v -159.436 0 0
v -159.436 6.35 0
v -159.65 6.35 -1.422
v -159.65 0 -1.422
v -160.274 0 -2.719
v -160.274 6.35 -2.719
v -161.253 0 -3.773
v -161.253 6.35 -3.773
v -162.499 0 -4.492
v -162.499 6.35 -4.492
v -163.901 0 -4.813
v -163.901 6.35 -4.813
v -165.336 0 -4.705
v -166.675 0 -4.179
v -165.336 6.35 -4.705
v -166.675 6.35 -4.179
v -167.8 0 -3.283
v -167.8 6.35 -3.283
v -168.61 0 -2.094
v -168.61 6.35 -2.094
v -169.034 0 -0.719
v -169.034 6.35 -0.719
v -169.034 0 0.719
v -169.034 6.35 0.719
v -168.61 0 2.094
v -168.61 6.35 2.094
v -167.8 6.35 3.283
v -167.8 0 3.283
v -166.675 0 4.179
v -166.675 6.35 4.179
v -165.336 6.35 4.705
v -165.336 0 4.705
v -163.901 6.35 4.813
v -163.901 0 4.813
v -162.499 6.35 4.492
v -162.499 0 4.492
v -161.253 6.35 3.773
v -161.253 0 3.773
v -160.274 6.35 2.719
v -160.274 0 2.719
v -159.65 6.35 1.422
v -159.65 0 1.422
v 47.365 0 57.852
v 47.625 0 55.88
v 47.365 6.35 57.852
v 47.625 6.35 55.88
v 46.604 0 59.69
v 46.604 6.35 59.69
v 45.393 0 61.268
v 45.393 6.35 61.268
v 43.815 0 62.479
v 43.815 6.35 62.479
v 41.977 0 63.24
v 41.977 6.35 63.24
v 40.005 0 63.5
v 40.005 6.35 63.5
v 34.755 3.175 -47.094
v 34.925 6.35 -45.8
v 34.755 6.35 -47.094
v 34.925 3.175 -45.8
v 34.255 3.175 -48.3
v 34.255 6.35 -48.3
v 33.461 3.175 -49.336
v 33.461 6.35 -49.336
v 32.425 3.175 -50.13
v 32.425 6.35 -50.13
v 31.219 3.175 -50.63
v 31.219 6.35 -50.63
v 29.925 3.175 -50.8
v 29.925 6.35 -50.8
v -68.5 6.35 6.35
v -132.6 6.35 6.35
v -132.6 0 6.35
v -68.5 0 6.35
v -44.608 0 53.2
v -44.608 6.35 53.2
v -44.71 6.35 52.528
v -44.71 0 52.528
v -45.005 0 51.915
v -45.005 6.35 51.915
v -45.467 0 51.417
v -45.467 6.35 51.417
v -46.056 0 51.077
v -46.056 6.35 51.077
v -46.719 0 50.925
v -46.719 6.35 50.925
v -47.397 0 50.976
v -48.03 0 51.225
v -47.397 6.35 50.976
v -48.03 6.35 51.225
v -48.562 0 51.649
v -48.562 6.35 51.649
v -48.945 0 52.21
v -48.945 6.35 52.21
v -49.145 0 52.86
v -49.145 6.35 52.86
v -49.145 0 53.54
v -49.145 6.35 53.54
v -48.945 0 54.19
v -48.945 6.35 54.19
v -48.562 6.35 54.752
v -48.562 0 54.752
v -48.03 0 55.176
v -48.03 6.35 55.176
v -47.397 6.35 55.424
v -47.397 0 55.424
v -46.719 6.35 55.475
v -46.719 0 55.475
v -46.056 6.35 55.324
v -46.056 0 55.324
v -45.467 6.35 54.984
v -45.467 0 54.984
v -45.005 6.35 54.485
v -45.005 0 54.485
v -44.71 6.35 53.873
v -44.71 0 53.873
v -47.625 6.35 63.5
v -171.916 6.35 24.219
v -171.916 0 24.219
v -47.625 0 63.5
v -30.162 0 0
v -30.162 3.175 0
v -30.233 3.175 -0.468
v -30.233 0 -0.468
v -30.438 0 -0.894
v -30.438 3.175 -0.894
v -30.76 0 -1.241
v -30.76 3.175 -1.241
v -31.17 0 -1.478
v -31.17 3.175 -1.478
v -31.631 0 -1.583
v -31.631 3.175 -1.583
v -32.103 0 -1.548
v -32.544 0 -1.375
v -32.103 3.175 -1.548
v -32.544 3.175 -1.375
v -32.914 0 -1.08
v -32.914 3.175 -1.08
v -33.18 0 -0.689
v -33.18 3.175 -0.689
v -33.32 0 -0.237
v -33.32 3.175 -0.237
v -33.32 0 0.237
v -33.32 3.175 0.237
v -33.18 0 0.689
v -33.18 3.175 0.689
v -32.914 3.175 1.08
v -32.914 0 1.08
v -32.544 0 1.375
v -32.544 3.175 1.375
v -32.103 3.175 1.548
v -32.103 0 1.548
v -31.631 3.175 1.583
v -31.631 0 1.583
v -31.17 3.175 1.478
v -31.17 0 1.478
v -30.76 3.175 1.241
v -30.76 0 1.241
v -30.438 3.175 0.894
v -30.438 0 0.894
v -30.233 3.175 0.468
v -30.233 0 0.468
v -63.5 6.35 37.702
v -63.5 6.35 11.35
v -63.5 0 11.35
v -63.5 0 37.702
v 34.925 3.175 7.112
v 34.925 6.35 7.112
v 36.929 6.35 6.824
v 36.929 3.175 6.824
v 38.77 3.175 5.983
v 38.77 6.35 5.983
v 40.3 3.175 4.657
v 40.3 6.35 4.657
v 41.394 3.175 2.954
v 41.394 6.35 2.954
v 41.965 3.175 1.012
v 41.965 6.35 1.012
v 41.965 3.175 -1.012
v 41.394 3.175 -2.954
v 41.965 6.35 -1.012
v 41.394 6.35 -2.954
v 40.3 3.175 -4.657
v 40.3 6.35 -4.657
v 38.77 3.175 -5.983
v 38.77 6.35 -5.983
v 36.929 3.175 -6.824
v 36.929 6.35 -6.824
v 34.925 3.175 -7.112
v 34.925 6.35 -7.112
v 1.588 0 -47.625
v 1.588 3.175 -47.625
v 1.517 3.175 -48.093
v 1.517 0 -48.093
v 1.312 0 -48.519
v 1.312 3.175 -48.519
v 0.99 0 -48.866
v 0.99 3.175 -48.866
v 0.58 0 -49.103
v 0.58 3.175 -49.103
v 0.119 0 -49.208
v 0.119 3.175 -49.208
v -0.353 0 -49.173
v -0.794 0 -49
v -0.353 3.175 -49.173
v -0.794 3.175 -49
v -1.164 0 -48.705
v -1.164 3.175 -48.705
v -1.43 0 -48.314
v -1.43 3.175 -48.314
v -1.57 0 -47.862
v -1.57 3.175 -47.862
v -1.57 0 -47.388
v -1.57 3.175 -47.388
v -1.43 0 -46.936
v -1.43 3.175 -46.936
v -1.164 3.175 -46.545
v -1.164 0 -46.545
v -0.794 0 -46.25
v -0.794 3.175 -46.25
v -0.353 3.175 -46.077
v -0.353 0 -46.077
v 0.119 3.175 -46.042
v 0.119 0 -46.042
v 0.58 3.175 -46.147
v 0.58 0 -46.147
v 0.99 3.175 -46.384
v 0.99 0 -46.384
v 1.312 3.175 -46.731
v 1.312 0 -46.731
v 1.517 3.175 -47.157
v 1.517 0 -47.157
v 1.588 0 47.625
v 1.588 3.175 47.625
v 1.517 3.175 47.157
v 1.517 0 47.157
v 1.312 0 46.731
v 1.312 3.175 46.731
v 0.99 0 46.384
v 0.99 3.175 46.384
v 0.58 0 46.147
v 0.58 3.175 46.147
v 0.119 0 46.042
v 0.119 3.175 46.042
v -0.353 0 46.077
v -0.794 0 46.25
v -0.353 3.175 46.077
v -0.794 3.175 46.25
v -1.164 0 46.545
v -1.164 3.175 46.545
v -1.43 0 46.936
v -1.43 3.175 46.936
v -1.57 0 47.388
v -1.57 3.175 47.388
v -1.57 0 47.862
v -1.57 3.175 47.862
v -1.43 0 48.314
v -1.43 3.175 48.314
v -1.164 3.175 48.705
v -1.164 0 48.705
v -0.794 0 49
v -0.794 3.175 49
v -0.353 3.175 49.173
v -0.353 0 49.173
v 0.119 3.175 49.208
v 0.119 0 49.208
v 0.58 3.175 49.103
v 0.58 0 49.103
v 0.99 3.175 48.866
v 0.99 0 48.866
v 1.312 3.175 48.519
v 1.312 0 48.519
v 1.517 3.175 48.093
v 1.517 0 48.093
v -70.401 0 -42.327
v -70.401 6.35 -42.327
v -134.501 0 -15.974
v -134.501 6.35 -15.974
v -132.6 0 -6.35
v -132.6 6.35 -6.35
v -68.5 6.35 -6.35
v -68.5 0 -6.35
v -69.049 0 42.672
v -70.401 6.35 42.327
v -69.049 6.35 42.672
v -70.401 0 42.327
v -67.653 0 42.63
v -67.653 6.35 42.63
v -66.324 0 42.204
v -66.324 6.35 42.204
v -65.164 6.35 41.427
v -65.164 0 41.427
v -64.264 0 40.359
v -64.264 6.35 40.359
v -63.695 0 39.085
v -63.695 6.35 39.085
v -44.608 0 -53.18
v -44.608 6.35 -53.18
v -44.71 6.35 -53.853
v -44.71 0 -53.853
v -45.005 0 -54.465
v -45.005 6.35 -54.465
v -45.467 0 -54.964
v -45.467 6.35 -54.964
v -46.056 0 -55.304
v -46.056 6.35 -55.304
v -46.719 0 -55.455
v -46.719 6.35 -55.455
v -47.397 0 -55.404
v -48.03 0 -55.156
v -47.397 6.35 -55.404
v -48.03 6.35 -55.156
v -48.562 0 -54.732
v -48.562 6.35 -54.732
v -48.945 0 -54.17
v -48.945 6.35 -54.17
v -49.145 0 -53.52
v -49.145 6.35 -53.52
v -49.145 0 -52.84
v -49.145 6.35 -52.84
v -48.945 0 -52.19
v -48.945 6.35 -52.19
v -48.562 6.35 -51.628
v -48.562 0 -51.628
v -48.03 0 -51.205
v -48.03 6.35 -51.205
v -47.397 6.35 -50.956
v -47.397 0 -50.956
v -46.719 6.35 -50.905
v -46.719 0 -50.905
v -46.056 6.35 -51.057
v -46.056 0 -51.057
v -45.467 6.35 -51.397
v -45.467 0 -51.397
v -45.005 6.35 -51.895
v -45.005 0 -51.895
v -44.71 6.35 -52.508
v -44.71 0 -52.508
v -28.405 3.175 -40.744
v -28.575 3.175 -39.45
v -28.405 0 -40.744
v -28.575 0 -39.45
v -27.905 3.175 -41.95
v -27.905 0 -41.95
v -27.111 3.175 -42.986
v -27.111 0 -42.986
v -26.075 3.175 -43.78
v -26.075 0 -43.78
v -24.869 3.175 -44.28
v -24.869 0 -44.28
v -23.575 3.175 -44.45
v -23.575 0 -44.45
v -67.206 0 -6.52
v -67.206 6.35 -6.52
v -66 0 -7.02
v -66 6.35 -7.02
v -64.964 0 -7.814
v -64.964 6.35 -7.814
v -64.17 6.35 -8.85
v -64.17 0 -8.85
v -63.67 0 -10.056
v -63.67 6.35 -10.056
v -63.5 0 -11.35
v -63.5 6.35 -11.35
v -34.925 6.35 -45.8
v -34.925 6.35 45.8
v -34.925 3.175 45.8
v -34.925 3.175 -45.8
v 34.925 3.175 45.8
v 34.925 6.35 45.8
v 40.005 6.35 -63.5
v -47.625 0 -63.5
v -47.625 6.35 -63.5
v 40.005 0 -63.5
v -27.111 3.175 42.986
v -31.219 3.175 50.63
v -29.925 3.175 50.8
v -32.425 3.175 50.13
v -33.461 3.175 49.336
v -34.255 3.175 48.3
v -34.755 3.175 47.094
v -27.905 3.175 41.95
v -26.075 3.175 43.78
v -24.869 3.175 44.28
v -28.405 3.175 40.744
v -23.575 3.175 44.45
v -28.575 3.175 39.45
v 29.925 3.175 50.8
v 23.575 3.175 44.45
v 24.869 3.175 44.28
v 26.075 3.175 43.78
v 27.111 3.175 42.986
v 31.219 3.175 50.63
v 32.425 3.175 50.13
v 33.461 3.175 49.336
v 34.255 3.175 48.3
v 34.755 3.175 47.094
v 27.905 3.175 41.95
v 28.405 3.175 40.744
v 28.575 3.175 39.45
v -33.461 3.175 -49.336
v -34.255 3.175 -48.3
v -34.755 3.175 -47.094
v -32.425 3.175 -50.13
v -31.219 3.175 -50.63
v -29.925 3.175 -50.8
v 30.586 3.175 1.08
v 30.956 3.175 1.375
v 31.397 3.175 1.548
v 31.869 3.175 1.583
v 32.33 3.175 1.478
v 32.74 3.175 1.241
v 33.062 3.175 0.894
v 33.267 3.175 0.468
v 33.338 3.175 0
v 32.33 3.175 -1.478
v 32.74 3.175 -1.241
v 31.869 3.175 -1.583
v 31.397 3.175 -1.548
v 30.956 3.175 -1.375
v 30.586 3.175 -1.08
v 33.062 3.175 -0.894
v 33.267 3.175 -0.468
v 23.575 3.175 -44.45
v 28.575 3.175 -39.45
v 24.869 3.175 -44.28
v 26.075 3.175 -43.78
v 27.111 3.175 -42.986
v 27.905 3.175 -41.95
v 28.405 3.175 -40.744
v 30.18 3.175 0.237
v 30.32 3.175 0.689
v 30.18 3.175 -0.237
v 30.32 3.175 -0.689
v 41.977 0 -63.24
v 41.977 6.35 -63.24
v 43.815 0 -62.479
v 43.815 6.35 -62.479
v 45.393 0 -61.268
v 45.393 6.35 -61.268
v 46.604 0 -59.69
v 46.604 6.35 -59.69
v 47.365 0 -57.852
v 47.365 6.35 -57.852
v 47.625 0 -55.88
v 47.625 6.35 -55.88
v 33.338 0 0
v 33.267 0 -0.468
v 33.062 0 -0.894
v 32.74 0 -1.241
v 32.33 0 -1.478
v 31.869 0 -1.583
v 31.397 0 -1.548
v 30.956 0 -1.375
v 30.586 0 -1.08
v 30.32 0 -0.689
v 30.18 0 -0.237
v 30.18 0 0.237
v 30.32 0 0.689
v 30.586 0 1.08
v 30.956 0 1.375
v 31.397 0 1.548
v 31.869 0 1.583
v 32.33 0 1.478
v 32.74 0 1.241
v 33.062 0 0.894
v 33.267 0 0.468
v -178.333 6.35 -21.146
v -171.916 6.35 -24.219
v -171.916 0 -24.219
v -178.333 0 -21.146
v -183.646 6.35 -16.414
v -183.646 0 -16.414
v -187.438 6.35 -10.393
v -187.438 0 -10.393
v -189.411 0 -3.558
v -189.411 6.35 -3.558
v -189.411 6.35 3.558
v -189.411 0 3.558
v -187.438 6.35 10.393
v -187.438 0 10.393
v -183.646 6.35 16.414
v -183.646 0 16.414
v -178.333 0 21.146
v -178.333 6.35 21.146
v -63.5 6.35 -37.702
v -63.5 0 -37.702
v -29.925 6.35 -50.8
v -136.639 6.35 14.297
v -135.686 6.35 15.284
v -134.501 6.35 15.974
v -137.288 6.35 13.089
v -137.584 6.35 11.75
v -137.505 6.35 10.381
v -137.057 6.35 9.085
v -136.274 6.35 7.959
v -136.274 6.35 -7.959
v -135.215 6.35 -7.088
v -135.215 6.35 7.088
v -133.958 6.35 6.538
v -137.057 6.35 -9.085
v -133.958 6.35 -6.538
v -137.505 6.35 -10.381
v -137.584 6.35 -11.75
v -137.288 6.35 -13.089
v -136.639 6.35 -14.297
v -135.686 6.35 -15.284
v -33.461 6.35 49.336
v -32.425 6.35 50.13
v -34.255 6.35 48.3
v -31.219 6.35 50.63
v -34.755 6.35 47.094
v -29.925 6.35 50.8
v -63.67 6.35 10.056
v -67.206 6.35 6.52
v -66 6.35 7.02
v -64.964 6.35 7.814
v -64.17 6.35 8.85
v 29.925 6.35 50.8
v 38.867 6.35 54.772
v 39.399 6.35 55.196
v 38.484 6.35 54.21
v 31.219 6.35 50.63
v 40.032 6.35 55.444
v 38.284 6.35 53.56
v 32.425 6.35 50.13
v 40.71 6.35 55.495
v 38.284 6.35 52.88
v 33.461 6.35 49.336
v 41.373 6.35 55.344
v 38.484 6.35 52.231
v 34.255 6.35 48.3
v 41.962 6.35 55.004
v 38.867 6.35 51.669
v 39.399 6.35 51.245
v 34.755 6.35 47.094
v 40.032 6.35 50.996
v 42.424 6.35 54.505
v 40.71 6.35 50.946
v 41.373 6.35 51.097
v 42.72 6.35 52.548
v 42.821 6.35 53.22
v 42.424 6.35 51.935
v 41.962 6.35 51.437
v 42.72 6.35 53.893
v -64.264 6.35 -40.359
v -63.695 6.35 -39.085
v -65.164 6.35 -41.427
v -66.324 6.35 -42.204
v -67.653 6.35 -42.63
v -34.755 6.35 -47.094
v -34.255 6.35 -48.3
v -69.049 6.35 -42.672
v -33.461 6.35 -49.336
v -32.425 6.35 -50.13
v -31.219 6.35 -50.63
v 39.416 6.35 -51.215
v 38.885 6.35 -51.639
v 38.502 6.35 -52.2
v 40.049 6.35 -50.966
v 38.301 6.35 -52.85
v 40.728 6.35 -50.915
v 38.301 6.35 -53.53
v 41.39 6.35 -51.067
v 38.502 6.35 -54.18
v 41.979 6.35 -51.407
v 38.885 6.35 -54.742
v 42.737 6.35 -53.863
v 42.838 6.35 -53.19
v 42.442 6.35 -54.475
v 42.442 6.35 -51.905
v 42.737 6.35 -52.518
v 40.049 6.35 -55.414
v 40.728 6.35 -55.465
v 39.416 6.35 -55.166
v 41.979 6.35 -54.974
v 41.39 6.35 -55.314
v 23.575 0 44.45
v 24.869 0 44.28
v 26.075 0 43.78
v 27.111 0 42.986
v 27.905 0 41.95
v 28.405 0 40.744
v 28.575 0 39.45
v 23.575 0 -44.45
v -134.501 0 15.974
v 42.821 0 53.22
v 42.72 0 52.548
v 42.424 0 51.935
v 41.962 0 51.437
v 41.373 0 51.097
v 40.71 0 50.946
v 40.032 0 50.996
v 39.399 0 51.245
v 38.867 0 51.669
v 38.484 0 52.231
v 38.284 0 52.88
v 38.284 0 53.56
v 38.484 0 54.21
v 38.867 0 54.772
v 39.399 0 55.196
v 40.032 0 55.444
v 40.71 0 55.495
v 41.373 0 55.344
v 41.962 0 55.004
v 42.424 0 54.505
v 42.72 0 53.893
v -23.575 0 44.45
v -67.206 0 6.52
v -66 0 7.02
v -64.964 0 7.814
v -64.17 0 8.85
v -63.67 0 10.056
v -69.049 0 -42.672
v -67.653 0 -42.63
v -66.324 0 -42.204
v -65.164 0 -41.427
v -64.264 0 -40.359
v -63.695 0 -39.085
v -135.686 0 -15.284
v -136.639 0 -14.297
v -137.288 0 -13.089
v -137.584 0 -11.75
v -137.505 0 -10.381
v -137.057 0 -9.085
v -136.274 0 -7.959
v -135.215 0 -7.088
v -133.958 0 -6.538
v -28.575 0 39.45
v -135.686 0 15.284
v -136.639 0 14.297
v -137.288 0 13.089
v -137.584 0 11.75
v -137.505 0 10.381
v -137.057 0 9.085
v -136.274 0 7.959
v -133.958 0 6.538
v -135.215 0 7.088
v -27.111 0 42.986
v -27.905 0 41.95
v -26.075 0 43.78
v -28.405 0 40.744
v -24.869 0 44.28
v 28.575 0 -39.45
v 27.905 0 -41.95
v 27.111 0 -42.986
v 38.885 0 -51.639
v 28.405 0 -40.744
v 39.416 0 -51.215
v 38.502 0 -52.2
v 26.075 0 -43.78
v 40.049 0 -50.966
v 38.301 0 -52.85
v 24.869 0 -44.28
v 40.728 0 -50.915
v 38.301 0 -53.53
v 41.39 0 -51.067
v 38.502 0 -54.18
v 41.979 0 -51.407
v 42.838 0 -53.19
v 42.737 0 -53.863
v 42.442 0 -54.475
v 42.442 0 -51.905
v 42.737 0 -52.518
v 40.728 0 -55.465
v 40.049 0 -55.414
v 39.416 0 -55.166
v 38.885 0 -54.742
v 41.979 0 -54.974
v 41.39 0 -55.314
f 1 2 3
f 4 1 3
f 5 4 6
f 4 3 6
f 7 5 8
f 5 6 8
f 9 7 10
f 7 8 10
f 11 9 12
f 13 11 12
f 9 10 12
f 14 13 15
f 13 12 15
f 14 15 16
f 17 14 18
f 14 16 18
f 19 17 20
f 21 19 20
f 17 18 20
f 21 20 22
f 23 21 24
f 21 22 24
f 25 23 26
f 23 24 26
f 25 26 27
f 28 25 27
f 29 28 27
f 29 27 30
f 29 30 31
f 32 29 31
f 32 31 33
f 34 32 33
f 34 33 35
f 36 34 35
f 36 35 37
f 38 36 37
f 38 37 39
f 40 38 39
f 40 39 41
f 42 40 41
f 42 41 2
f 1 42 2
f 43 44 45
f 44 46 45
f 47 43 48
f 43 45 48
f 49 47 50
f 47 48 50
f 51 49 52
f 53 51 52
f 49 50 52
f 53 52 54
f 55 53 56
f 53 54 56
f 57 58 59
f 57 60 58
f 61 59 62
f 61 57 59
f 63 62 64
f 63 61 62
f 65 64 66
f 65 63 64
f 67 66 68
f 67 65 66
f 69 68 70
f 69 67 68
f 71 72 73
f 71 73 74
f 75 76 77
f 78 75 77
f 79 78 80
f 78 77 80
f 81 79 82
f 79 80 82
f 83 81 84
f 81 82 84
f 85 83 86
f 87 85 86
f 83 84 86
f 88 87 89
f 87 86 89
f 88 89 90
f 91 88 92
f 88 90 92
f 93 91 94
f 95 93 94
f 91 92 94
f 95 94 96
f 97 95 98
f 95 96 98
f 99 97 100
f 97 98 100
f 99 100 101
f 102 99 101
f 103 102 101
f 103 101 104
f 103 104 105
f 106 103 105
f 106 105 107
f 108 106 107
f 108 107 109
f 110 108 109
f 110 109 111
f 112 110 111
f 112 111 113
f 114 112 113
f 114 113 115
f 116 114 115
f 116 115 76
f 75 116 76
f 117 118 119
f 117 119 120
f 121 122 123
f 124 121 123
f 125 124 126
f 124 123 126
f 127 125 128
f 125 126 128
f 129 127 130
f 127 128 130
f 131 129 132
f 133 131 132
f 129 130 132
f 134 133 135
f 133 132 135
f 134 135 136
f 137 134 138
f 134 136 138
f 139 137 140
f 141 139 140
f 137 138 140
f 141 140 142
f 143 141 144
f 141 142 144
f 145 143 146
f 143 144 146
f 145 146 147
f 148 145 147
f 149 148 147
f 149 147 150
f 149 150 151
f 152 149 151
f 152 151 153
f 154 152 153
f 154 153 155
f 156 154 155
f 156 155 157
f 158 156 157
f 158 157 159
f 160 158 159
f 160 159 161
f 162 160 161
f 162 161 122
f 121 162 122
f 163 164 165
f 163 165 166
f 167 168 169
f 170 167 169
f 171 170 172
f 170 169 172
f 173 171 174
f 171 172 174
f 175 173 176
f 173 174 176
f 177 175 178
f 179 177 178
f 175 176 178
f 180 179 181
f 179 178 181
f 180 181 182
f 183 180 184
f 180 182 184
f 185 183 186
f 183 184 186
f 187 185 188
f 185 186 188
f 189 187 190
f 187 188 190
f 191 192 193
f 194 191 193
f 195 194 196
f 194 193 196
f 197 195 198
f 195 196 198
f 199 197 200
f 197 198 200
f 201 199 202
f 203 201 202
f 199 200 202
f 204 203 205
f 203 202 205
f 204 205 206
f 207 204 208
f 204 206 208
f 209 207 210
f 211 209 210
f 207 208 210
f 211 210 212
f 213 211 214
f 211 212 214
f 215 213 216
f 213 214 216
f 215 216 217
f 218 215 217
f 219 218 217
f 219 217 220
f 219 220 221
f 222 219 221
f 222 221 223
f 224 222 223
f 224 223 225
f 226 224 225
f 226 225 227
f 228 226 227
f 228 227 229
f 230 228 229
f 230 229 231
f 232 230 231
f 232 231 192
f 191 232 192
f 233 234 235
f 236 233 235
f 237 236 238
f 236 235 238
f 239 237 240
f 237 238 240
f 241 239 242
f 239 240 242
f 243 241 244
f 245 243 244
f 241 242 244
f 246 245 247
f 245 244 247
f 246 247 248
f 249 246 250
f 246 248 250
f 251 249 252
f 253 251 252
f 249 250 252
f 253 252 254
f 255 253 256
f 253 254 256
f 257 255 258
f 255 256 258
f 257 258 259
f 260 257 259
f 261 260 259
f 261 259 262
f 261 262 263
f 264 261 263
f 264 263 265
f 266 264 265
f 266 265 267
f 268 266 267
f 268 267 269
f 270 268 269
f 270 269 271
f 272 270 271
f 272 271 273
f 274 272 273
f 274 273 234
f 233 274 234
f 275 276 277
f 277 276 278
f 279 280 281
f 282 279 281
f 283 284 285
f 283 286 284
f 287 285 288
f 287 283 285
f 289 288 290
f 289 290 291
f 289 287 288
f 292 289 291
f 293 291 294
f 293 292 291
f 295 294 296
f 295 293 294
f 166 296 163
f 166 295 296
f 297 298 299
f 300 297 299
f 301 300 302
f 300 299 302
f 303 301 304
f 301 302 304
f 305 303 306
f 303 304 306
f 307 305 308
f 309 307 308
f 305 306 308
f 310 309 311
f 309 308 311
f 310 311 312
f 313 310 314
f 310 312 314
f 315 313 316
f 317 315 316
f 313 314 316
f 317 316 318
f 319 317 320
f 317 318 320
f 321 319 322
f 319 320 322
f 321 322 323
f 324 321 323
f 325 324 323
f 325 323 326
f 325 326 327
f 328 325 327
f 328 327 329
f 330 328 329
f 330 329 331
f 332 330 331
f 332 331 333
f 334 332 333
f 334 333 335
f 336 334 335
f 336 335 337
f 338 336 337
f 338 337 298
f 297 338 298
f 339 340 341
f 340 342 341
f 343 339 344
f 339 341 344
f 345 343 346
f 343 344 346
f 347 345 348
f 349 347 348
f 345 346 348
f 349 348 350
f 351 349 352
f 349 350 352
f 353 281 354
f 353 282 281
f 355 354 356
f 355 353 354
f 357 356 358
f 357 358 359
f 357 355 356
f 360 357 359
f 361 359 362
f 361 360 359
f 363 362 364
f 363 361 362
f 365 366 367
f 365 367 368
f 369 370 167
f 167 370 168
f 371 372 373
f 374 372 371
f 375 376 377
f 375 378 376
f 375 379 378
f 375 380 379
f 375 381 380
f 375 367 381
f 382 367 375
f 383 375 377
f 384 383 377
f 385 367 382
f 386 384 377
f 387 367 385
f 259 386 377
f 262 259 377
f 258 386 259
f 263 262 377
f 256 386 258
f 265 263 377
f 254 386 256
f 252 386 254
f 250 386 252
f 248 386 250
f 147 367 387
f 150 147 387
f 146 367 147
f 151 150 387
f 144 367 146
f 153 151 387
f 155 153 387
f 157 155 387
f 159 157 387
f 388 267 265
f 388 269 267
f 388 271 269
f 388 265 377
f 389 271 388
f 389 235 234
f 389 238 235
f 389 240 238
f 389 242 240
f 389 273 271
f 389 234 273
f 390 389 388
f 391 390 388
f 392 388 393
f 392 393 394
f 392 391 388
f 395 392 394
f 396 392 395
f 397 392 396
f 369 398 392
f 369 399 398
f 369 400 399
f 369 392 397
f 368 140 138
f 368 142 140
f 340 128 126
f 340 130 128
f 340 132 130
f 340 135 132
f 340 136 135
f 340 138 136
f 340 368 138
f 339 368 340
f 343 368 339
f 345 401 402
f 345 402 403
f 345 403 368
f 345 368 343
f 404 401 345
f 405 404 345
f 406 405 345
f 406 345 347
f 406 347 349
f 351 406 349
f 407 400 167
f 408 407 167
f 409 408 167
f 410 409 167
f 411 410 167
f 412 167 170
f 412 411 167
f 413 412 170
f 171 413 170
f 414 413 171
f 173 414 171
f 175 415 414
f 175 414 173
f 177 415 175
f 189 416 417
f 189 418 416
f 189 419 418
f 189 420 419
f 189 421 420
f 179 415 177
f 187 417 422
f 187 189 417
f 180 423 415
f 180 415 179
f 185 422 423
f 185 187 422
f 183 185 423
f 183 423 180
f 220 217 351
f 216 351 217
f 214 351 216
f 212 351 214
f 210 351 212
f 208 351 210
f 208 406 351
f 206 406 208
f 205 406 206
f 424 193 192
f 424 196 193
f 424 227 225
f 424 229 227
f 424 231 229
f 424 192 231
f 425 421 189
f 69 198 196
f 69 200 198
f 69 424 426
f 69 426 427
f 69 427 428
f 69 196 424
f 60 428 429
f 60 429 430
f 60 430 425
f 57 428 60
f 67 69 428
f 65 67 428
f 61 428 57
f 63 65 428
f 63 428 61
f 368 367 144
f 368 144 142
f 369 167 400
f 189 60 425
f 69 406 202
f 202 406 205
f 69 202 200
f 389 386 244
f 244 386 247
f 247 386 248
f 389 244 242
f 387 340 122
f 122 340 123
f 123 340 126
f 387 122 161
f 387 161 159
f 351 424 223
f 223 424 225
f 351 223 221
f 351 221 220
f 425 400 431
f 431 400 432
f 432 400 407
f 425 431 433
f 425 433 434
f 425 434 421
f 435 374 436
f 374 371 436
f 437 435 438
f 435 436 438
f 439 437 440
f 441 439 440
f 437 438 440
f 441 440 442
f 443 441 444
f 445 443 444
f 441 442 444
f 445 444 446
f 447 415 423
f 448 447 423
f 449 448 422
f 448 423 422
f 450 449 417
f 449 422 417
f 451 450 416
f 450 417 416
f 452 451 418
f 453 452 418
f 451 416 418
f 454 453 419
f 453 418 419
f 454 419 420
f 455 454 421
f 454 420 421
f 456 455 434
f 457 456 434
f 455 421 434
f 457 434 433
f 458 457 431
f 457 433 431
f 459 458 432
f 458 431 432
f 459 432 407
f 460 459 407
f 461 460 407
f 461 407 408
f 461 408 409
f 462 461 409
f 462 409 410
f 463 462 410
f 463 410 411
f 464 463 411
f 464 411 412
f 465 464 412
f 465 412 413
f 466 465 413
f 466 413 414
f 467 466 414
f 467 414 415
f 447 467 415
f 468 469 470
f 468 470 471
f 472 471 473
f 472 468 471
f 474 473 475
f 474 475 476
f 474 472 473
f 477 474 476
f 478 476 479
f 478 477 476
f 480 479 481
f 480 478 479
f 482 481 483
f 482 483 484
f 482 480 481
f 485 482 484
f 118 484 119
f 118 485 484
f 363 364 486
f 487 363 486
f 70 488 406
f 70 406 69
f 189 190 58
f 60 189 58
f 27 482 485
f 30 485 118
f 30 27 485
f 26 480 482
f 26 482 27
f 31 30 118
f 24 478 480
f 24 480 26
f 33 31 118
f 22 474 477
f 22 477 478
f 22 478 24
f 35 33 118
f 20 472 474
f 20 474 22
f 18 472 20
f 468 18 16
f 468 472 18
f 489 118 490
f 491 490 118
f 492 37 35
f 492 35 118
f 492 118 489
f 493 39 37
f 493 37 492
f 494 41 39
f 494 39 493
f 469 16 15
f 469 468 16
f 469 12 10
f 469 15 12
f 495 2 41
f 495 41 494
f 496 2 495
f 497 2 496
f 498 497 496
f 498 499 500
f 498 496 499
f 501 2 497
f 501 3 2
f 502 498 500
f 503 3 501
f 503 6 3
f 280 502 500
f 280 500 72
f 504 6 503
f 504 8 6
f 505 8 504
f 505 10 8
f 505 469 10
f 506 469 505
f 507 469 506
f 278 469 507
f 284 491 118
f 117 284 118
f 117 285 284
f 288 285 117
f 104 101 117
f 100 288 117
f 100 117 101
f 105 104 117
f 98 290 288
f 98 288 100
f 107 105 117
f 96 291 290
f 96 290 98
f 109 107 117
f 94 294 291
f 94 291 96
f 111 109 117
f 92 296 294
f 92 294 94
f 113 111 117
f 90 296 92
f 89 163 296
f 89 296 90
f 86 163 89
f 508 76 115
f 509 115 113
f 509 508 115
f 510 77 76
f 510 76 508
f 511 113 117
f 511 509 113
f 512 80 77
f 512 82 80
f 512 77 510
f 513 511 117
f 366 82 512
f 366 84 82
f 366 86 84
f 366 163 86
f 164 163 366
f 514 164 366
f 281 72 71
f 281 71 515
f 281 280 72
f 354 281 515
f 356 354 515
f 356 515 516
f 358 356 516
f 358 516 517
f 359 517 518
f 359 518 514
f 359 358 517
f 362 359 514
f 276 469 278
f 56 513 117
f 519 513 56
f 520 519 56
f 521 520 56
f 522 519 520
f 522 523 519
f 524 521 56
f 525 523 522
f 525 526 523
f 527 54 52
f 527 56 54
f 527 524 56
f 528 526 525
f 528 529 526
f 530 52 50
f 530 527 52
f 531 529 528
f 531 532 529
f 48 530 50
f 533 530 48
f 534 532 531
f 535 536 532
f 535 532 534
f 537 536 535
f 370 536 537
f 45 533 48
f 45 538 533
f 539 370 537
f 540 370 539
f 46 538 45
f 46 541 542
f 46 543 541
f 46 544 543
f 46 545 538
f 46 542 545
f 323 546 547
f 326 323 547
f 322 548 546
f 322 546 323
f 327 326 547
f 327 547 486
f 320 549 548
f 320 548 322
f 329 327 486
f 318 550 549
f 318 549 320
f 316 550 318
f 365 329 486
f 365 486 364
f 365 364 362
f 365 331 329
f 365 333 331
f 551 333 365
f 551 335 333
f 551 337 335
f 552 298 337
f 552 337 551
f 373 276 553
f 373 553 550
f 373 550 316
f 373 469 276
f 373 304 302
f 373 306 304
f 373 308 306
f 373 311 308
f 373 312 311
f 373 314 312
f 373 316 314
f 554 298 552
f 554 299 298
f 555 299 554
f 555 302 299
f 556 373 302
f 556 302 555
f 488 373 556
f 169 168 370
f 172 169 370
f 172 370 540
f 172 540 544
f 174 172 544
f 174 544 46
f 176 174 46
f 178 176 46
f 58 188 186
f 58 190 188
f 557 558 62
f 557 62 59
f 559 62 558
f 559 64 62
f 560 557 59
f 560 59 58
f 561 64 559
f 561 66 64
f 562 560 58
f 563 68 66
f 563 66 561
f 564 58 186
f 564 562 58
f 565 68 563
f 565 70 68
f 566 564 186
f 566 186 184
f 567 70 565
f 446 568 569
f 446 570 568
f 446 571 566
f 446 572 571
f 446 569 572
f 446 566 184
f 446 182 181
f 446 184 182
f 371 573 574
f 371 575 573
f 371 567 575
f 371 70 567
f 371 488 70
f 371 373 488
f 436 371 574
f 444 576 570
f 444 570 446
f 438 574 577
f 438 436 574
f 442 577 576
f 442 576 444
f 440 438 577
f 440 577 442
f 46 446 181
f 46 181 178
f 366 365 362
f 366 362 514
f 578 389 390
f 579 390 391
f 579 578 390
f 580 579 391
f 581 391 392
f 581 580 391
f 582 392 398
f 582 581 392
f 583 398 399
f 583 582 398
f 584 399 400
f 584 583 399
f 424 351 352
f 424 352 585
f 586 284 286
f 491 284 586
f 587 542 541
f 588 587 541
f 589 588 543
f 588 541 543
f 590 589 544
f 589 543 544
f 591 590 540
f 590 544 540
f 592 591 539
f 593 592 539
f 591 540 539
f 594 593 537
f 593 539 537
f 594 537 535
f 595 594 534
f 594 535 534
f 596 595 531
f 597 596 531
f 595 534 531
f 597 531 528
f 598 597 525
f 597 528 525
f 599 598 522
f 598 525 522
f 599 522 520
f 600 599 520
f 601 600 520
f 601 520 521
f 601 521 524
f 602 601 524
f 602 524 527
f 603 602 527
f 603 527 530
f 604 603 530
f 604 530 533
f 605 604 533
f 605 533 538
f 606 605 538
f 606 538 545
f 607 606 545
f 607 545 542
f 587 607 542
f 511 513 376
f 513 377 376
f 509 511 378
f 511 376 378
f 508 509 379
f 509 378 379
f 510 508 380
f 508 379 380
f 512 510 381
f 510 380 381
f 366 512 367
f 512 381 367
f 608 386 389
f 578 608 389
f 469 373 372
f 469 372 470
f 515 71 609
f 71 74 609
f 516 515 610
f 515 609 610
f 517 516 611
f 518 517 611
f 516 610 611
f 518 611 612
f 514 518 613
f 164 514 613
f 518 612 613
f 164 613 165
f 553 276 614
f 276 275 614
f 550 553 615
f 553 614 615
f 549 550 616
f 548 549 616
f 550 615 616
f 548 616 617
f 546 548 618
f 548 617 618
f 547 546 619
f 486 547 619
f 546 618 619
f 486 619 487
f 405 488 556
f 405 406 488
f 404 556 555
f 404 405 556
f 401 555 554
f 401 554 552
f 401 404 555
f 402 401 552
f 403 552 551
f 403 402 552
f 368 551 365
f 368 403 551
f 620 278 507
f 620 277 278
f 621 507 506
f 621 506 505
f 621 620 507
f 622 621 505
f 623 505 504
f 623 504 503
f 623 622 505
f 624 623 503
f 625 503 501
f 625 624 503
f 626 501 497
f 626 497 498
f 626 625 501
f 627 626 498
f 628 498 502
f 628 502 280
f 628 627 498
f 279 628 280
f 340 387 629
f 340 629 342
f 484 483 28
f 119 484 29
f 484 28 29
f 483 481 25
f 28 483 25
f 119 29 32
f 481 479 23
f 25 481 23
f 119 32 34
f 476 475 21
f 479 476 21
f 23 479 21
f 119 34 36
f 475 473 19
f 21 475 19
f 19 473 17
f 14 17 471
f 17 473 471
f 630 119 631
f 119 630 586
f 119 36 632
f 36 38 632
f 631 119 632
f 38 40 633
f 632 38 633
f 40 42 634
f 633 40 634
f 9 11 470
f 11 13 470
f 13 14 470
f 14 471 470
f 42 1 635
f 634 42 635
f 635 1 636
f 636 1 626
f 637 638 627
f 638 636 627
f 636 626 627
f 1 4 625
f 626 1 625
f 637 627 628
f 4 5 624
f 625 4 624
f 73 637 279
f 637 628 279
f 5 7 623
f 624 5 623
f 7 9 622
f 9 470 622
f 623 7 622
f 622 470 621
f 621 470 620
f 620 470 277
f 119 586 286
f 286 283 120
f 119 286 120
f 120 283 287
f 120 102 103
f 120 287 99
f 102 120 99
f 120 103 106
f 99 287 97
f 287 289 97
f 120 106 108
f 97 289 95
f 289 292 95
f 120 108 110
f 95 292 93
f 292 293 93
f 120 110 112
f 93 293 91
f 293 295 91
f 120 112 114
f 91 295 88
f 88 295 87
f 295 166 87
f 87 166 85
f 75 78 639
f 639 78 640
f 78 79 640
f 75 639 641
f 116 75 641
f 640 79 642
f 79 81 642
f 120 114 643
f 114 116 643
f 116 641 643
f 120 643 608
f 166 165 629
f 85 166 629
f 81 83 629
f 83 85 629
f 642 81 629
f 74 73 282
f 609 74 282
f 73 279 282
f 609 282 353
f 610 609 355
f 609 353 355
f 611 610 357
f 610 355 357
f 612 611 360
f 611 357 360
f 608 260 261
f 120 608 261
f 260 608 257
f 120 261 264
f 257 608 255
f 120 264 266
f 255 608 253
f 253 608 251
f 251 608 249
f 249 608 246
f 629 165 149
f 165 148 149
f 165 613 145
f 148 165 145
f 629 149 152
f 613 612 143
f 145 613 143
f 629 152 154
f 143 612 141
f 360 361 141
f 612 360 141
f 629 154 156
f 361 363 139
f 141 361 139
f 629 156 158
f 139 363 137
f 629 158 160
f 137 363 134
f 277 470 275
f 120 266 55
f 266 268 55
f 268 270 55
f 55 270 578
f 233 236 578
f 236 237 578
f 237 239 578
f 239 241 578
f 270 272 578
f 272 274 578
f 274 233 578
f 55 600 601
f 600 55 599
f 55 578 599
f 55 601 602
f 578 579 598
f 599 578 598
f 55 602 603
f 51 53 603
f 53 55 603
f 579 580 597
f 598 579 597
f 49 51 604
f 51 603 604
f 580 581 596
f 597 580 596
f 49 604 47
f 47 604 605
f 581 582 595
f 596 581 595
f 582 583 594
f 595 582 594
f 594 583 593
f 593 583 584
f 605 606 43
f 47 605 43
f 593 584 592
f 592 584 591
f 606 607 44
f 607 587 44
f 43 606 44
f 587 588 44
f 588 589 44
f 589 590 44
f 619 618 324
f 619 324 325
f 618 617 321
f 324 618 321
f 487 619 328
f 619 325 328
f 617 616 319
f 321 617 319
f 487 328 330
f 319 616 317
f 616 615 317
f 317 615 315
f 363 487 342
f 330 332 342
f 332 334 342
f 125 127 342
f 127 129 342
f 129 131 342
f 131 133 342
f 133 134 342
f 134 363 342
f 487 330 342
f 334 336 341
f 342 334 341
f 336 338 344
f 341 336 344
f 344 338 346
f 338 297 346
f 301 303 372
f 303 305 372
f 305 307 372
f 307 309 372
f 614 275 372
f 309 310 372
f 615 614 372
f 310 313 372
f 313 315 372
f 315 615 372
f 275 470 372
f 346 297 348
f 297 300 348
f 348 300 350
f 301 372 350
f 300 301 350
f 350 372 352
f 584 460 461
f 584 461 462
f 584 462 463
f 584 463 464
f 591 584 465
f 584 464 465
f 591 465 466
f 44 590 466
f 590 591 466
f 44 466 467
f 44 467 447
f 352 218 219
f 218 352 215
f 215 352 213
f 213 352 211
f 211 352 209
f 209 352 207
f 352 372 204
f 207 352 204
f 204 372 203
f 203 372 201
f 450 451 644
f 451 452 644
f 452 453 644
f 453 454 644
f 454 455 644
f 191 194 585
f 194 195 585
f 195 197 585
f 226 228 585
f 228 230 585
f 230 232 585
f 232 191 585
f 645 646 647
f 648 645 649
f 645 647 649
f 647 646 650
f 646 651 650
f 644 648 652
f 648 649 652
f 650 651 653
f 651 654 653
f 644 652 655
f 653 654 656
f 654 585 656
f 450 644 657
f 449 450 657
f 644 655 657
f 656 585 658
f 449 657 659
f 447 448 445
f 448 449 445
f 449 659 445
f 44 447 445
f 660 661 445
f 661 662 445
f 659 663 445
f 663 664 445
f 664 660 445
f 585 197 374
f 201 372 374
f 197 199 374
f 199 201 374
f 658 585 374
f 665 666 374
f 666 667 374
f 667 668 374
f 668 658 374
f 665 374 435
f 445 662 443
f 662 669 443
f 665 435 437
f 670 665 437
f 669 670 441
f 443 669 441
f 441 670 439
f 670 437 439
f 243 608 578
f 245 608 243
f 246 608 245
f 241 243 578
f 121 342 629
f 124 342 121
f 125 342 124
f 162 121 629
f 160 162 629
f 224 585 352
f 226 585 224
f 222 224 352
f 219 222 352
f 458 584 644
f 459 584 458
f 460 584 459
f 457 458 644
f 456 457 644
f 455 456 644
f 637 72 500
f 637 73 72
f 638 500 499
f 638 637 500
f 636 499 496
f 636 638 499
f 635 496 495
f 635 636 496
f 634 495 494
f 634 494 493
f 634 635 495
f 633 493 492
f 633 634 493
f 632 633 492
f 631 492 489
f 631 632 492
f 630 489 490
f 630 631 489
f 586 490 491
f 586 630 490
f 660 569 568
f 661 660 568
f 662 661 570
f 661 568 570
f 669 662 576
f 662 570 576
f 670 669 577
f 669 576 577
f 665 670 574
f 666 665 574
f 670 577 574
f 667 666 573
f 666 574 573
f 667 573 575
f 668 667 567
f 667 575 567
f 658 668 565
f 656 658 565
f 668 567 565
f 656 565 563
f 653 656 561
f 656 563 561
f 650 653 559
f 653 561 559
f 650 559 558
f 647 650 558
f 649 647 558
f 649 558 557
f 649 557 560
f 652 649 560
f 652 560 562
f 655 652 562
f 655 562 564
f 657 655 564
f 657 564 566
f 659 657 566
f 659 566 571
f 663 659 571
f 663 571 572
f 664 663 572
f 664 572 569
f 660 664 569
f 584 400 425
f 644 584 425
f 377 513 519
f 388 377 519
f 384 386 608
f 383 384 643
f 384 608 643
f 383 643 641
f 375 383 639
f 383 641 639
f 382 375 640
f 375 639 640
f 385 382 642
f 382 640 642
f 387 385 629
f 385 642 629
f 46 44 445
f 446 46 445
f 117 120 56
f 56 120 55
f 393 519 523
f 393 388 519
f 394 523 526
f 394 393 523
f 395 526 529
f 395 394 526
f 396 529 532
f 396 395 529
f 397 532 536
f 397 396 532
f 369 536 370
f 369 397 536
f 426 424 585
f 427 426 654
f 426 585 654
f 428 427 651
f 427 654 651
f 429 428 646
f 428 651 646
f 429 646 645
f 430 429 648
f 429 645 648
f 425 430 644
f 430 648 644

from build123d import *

# Parameters (mm, degrees)
SKETCH1_W           = 95.25
SKETCH1_H           = 127
BOSS_EXTRUDE1_DEPTH = 6.35
BOSS_EXTRUDE3_DEPTH = 6.35
SKETCH5_R           = 4.826
CUT_EXTRUDE1_DEPTH  = 7.35
CUT_EXTRUDE2_DEPTH  = 7.35
FILLET9_R           = 5
SKETCH7_R           = 5.453804141
BOSS_EXTRUDE4_DEPTH = 6.35
SKETCH8_W           = 69.85
SKETCH8_H           = 101.6
CUT_EXTRUDE3_DEPTH  = 3.175
SKETCH9_W           = 57.15
SKETCH9_H           = 88.9
CUT_EXTRUDE4_DEPTH  = 4.175
SKETCH11_R          = 1.5875
CUT_EXTRUDE6_DEPTH  = 4.175
CUT_EXTRUDE7_DEPTH  = 3.175
FILLET10_R          = 5
FILLET11_R          = 5
FILLET12_R          = 7.62
SKETCH13_R          = 2.2812375
CUT_EXTRUDE8_DEPTH  = 7.35


with BuildPart() as part:
    # Sketch1 → Boss-Extrude1 (new body)
    with BuildSketch(Plane(origin=(0, 0, 0), x_dir=(1, 0, 0), z_dir=(0, 1, 0))):
        Rectangle(SKETCH1_W, SKETCH1_H)
    extrude(amount=BOSS_EXTRUDE1_DEPTH)

    # Sketch4 → Boss-Extrude3 (add)
    with BuildSketch(Plane(origin=(0, 6.35, 0), x_dir=(1, 0, 0), z_dir=(0, 1, 0))):
        with BuildLine():
            Line((-47.625, 63.5), (-171.916018217, 24.219268021))
            ThreePointArc((-171.916018217, 24.219268021), (-189.6618, 0), (-171.916018217, -24.219268021))
            Line((-171.916018217, -24.219268021), (-47.625, -63.5))
            Line((-47.625, -63.5), (-47.625, 63.5))
        make_face()
    extrude(amount=-BOSS_EXTRUDE3_DEPTH)

    # Sketch5 → Cut-Extrude1 (cut, through all)
    with BuildSketch(Plane(origin=(0, 6.35, 0), x_dir=(1, 0, 0), z_dir=(0, 1, 0))):
        with Locations((-164.2618, 0)):
            Circle(SKETCH5_R)
        with Locations((-8.6868, 0)):
            Circle(SKETCH5_R)
    extrude(amount=-CUT_EXTRUDE1_DEPTH, mode=Mode.SUBTRACT)

    # Sketch6 → Cut-Extrude2 (cut, through all)
    with BuildSketch(Plane(origin=(0, 6.35, 0), x_dir=(1, 0, 0), z_dir=(0, 1, 0))):
        Polygon((-63.5, 45.163743355), (-157.9118, 6.35), (-63.5, 6.35), align=None)
        Polygon((-63.5, -6.35), (-63.5, -45.163743355), (-157.9118, -6.35), align=None)
    extrude(amount=-CUT_EXTRUDE2_DEPTH, mode=Mode.SUBTRACT)

    # Fillet9
    fillet9_edges = [part.edges().sort_by_distance(p)[0] for p in [
        (-63.5, 3.175, -45.163743355),
        (-63.5, 3.175, -6.35),
        (-157.9118, 3.175, -6.35),
        (-157.9118, 3.175, 6.35),
        (-63.5, 3.175, 6.35),
        (-63.5, 3.175, 45.163743355),
    ]]
    fillet(fillet9_edges, radius=FILLET9_R)

    # Sketch7 → Boss-Extrude4 (add)
    with BuildSketch(Plane(origin=(0, 6.35, 0), x_dir=(1, 0, 0), z_dir=(0, 1, 0))):
        with Locations((-8.6868, 0)):
            Circle(SKETCH7_R)
    extrude(amount=-BOSS_EXTRUDE4_DEPTH)

    # Sketch8 → Cut-Extrude3 (cut)
    with BuildSketch(Plane(origin=(0, 6.35, 0), x_dir=(1, 0, 0), z_dir=(0, 1, 0))):
        Rectangle(SKETCH8_W, SKETCH8_H)
    extrude(amount=-CUT_EXTRUDE3_DEPTH, mode=Mode.SUBTRACT)

    # Sketch9 → Cut-Extrude4 (cut, through all)
    with BuildSketch(Plane(origin=(0, 3.175, 0), x_dir=(1, 0, 0), z_dir=(0, 1, 0))):
        Rectangle(SKETCH9_W, SKETCH9_H)
    extrude(amount=-CUT_EXTRUDE4_DEPTH, mode=Mode.SUBTRACT)

    # Sketch11 → Cut-Extrude6 (cut, through all)
    with BuildSketch(Plane(origin=(0, 3.175, 0), x_dir=(1, 0, 0), z_dir=(0, 1, 0))):
        with Locations((-31.75, 0)):
            Circle(SKETCH11_R)
        with Locations((31.75, 0)):
            Circle(SKETCH11_R)
        with Locations((0, 47.625)):
            Circle(SKETCH11_R)
        with Locations((0, -47.625)):
            Circle(SKETCH11_R)
    extrude(amount=-CUT_EXTRUDE6_DEPTH, mode=Mode.SUBTRACT)

    # Sketch12 → Cut-Extrude7 (cut)
    with BuildSketch(Plane(origin=(0, 6.35, 0), x_dir=(1, 0, 0), z_dir=(0, 1, 0))):
        with BuildLine():
            Line((34.925, 7.112), (34.925, -7.112))
            ThreePointArc((34.925, -7.112), (42.037, 0), (34.925, 7.112))
        make_face()
    extrude(amount=-CUT_EXTRUDE7_DEPTH, mode=Mode.SUBTRACT)

    # Fillet10
    fillet10_edges = [part.edges().sort_by_distance(p)[0] for p in [
        (-34.925, 4.7625, -50.8),
        (34.925, 4.7625, -50.8),
        (34.925, 4.7625, 50.8),
        (-34.925, 4.7625, 50.8),
    ]]
    fillet(fillet10_edges, radius=FILLET10_R)

    # Fillet11
    fillet11_edges = [part.edges().sort_by_distance(p)[0] for p in [
        (-28.575, 1.5875, 44.45),
        (-28.575, 1.5875, -44.45),
        (28.575, 1.5875, -44.45),
        (28.575, 1.5875, 44.45),
    ]]
    fillet(fillet11_edges, radius=FILLET11_R)

    # Fillet12
    fillet12_edges = [part.edges().sort_by_distance(p)[0] for p in [
        (47.625, 3.175, 63.5),
        (47.625, 3.175, -63.5),
    ]]
    fillet(fillet12_edges, radius=FILLET12_R)

    # Sketch13 → Cut-Extrude8 (cut, through all)
    with BuildSketch(Plane(origin=(0, 6.35, 0), x_dir=(1, 0, 0), z_dir=(0, 1, 0))):
        with Locations((-46.889614099, 53.180131976)):
            Circle(SKETCH13_R)
        with Locations((-46.889614099, -53.200246229)):
            Circle(SKETCH13_R)
        with Locations((40.539614099, -53.220360481)):
            Circle(SKETCH13_R)
        with Locations((40.557033552, 53.190189103)):
            Circle(SKETCH13_R)
    extrude(amount=-CUT_EXTRUDE8_DEPTH, mode=Mode.SUBTRACT)


solid = part.part
